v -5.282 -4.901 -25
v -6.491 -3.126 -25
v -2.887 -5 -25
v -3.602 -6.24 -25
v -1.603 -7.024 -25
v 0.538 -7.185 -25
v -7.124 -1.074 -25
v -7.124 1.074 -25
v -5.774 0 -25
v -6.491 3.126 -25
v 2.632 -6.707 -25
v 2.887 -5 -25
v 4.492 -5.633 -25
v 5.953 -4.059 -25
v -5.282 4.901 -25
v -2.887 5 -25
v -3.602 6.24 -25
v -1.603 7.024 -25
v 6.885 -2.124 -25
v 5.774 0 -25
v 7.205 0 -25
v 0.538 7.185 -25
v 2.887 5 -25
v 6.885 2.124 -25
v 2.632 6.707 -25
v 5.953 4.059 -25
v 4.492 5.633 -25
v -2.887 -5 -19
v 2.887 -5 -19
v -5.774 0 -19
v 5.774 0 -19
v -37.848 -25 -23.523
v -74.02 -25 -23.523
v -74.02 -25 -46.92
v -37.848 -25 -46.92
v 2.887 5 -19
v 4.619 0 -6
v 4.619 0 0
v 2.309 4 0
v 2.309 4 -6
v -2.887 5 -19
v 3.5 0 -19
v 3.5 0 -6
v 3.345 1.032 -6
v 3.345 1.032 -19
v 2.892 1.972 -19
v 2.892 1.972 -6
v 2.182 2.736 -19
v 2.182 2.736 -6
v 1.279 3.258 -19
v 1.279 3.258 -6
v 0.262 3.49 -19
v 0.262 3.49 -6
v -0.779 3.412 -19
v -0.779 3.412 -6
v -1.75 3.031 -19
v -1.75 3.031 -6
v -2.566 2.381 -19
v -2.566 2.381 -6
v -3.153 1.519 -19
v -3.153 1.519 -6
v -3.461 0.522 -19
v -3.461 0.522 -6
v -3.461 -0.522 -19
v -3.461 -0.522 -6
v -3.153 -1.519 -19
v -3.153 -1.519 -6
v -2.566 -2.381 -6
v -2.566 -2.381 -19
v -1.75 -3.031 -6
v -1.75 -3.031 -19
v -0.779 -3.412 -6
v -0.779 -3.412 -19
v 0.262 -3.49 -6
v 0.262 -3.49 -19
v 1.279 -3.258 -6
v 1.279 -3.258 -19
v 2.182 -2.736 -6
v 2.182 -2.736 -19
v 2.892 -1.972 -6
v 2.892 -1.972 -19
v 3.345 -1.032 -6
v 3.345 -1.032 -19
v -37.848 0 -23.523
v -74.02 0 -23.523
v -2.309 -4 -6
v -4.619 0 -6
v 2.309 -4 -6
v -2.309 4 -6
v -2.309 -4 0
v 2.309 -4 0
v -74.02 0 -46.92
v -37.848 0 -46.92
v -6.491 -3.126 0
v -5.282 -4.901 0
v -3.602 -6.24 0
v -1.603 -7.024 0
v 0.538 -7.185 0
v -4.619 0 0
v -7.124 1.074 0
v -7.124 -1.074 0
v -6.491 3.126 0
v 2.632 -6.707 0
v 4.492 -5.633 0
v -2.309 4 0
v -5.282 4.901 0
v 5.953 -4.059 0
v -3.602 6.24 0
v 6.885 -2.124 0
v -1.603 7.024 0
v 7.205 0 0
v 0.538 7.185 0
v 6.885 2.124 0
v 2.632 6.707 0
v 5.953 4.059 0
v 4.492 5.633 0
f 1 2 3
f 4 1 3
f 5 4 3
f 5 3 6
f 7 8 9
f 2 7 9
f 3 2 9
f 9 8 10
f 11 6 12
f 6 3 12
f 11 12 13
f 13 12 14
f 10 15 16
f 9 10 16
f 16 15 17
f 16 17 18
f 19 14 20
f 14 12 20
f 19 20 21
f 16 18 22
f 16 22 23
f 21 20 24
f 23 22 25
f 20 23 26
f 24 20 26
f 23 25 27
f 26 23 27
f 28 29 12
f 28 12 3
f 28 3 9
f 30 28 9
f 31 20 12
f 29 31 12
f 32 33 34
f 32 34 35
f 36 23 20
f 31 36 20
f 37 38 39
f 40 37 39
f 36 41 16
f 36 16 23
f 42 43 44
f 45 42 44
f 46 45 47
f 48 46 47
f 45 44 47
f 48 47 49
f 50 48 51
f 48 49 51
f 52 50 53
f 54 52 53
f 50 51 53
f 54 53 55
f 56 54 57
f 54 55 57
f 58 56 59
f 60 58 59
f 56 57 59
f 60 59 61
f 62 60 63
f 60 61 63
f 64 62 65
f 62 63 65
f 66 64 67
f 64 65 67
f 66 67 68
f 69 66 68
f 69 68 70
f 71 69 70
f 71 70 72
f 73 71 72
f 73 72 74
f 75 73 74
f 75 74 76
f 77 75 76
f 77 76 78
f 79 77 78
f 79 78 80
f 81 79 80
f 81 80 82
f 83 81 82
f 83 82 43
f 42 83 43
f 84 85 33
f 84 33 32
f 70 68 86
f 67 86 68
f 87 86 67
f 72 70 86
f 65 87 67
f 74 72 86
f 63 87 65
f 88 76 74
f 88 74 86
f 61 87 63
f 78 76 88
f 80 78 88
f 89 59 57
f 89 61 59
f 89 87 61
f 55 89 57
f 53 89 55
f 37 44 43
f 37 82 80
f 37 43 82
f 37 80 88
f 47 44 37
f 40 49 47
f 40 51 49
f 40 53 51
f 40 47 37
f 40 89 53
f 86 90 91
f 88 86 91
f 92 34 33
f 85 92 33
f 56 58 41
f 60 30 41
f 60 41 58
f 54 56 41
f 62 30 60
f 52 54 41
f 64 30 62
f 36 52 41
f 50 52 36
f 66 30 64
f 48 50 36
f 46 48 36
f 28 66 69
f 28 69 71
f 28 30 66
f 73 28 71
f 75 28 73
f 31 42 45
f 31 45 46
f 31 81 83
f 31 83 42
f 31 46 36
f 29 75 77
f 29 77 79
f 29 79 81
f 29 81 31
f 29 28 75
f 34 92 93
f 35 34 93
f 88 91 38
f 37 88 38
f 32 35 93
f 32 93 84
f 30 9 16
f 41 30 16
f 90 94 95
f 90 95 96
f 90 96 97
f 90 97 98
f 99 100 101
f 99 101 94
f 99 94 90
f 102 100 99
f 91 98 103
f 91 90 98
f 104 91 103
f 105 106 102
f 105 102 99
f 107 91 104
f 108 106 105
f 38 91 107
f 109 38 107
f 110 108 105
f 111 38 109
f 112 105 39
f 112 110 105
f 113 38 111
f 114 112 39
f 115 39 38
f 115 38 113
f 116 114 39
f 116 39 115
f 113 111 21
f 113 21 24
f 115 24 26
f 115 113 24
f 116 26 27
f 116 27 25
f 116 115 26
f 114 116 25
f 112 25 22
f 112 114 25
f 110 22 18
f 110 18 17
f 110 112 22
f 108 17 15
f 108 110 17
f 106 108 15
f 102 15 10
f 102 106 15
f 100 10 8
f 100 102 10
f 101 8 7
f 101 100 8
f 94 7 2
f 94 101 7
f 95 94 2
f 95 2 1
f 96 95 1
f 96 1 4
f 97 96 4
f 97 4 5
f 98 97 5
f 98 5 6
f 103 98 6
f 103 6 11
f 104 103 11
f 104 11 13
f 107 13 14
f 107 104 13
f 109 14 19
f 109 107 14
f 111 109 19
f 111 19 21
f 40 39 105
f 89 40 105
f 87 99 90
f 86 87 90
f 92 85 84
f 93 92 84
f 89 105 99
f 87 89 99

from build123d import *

# Parameters (mm, degrees)
F0_R      = 7.204837
F1_DEPTH  = 25
F3_DEPTH  = 6
F6_DEPTH  = 6
F7_R      = 3.5
F8_DEPTH  = 25
F9_W      = 36.172304
F9_H      = 23.396552
F10_DEPTH = 25


with BuildPart() as f1:
    # F0 (on Top) → F1 (new body)
    with BuildSketch(Plane.XY):
        Circle(F0_R)
    extrude(amount=-F1_DEPTH)

    # F2 (on face) → F3 (cut)
    with BuildSketch(Plane.XY):
        Polygon((-2.309401, -4), (2.309401, -4), (4.618802, 0), (2.309401, 4), (-2.309401, 4), (-4.618802, 0), align=None)
    extrude(amount=-F3_DEPTH, mode=Mode.SUBTRACT)

    # F5 (on face) → F6 (cut)
    with BuildSketch(Plane(origin=(0, 0, -25), x_dir=(1, 0, 0), z_dir=(0, 0, -1))):
        Polygon((2.886751, 5), (-2.886751, 5), (-5.773503, 0), (-2.886751, -5), (2.886751, -5), (5.773503, 0), align=None)
    extrude(amount=-F6_DEPTH, mode=Mode.SUBTRACT)

    # F7 (on Top) → F8 (cut)
    with BuildSketch(Plane.XY):
        Circle(F7_R)
    extrude(amount=-F8_DEPTH, mode=Mode.SUBTRACT)


with BuildPart() as f10:
    # F9 (on Front) → F10 (new body)
    with BuildSketch(Plane.XZ):
        with Locations((-55.934271, -35.22167)):
            Rectangle(F9_W, F9_H)
    extrude(amount=F10_DEPTH)


solid = Compound([f1.part, f10.part])
